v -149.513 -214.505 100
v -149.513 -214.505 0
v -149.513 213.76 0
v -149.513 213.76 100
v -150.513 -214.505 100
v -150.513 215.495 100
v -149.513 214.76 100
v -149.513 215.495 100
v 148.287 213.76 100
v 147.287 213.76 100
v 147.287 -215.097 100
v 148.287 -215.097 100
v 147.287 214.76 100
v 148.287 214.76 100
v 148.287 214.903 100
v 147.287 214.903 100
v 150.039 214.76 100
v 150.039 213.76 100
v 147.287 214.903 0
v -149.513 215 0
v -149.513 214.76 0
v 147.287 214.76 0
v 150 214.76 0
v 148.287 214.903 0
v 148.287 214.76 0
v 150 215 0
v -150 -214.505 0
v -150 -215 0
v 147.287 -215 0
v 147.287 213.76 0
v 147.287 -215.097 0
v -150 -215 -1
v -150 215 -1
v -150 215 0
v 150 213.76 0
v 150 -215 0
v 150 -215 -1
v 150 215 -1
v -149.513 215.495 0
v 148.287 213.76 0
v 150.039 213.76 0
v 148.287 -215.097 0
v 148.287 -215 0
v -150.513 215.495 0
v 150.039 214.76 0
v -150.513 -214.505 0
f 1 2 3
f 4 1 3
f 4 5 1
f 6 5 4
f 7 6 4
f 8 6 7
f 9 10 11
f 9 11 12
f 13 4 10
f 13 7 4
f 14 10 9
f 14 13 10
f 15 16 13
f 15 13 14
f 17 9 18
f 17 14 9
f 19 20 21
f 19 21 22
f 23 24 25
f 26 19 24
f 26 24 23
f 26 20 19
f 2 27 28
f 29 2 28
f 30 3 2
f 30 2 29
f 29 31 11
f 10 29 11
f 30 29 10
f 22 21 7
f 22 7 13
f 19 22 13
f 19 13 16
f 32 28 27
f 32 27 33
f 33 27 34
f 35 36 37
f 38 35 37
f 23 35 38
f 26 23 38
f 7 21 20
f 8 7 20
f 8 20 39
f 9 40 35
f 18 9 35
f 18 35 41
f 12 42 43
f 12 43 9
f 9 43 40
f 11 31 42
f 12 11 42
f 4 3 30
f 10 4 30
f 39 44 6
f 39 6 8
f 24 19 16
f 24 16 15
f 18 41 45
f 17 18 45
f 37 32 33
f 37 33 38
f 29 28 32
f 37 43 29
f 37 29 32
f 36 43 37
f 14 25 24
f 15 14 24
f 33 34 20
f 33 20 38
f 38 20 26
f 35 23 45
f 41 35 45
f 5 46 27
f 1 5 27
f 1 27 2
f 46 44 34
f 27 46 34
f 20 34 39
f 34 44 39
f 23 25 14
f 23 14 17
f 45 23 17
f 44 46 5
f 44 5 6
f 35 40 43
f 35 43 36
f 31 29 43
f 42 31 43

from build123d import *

# Parameters (mm, degrees)
F0_W     = 300
F0_H     = 430
F1_DEPTH = 1
F2_W     = 300
F2_H     = 1
F3_DEPTH = 100
F4_W     = 1
F4_H     = 430
F5_DEPTH = 100
F6_W     = 1
F6_H     = 430
F7_DEPTH = 100


with BuildPart() as f1:
    # F0 (on Top) → F1 (new body)
    with BuildSketch(Plane.XY):
        Rectangle(F0_W, F0_H)
    extrude(amount=-F1_DEPTH)

    # F2 (on Top) → F3 (join)
    with BuildSketch(Plane.XY):
        with Locations((0.038886, 214.259856)):
            Rectangle(F2_W, F2_H)
    extrude(amount=F3_DEPTH)

    # F4 (on Top) → F5 (join)
    with BuildSketch(Plane.XY):
        with Locations((147.787129, -0.097331)):
            Rectangle(F4_W, F4_H)
    extrude(amount=F5_DEPTH)

    # F6 (on Top) → F7 (join)
    with BuildSketch(Plane.XY):
        with Locations((-150.013192, 0.495426)):
            Rectangle(F6_W, F6_H)
    extrude(amount=F7_DEPTH)


solid = f1.part
